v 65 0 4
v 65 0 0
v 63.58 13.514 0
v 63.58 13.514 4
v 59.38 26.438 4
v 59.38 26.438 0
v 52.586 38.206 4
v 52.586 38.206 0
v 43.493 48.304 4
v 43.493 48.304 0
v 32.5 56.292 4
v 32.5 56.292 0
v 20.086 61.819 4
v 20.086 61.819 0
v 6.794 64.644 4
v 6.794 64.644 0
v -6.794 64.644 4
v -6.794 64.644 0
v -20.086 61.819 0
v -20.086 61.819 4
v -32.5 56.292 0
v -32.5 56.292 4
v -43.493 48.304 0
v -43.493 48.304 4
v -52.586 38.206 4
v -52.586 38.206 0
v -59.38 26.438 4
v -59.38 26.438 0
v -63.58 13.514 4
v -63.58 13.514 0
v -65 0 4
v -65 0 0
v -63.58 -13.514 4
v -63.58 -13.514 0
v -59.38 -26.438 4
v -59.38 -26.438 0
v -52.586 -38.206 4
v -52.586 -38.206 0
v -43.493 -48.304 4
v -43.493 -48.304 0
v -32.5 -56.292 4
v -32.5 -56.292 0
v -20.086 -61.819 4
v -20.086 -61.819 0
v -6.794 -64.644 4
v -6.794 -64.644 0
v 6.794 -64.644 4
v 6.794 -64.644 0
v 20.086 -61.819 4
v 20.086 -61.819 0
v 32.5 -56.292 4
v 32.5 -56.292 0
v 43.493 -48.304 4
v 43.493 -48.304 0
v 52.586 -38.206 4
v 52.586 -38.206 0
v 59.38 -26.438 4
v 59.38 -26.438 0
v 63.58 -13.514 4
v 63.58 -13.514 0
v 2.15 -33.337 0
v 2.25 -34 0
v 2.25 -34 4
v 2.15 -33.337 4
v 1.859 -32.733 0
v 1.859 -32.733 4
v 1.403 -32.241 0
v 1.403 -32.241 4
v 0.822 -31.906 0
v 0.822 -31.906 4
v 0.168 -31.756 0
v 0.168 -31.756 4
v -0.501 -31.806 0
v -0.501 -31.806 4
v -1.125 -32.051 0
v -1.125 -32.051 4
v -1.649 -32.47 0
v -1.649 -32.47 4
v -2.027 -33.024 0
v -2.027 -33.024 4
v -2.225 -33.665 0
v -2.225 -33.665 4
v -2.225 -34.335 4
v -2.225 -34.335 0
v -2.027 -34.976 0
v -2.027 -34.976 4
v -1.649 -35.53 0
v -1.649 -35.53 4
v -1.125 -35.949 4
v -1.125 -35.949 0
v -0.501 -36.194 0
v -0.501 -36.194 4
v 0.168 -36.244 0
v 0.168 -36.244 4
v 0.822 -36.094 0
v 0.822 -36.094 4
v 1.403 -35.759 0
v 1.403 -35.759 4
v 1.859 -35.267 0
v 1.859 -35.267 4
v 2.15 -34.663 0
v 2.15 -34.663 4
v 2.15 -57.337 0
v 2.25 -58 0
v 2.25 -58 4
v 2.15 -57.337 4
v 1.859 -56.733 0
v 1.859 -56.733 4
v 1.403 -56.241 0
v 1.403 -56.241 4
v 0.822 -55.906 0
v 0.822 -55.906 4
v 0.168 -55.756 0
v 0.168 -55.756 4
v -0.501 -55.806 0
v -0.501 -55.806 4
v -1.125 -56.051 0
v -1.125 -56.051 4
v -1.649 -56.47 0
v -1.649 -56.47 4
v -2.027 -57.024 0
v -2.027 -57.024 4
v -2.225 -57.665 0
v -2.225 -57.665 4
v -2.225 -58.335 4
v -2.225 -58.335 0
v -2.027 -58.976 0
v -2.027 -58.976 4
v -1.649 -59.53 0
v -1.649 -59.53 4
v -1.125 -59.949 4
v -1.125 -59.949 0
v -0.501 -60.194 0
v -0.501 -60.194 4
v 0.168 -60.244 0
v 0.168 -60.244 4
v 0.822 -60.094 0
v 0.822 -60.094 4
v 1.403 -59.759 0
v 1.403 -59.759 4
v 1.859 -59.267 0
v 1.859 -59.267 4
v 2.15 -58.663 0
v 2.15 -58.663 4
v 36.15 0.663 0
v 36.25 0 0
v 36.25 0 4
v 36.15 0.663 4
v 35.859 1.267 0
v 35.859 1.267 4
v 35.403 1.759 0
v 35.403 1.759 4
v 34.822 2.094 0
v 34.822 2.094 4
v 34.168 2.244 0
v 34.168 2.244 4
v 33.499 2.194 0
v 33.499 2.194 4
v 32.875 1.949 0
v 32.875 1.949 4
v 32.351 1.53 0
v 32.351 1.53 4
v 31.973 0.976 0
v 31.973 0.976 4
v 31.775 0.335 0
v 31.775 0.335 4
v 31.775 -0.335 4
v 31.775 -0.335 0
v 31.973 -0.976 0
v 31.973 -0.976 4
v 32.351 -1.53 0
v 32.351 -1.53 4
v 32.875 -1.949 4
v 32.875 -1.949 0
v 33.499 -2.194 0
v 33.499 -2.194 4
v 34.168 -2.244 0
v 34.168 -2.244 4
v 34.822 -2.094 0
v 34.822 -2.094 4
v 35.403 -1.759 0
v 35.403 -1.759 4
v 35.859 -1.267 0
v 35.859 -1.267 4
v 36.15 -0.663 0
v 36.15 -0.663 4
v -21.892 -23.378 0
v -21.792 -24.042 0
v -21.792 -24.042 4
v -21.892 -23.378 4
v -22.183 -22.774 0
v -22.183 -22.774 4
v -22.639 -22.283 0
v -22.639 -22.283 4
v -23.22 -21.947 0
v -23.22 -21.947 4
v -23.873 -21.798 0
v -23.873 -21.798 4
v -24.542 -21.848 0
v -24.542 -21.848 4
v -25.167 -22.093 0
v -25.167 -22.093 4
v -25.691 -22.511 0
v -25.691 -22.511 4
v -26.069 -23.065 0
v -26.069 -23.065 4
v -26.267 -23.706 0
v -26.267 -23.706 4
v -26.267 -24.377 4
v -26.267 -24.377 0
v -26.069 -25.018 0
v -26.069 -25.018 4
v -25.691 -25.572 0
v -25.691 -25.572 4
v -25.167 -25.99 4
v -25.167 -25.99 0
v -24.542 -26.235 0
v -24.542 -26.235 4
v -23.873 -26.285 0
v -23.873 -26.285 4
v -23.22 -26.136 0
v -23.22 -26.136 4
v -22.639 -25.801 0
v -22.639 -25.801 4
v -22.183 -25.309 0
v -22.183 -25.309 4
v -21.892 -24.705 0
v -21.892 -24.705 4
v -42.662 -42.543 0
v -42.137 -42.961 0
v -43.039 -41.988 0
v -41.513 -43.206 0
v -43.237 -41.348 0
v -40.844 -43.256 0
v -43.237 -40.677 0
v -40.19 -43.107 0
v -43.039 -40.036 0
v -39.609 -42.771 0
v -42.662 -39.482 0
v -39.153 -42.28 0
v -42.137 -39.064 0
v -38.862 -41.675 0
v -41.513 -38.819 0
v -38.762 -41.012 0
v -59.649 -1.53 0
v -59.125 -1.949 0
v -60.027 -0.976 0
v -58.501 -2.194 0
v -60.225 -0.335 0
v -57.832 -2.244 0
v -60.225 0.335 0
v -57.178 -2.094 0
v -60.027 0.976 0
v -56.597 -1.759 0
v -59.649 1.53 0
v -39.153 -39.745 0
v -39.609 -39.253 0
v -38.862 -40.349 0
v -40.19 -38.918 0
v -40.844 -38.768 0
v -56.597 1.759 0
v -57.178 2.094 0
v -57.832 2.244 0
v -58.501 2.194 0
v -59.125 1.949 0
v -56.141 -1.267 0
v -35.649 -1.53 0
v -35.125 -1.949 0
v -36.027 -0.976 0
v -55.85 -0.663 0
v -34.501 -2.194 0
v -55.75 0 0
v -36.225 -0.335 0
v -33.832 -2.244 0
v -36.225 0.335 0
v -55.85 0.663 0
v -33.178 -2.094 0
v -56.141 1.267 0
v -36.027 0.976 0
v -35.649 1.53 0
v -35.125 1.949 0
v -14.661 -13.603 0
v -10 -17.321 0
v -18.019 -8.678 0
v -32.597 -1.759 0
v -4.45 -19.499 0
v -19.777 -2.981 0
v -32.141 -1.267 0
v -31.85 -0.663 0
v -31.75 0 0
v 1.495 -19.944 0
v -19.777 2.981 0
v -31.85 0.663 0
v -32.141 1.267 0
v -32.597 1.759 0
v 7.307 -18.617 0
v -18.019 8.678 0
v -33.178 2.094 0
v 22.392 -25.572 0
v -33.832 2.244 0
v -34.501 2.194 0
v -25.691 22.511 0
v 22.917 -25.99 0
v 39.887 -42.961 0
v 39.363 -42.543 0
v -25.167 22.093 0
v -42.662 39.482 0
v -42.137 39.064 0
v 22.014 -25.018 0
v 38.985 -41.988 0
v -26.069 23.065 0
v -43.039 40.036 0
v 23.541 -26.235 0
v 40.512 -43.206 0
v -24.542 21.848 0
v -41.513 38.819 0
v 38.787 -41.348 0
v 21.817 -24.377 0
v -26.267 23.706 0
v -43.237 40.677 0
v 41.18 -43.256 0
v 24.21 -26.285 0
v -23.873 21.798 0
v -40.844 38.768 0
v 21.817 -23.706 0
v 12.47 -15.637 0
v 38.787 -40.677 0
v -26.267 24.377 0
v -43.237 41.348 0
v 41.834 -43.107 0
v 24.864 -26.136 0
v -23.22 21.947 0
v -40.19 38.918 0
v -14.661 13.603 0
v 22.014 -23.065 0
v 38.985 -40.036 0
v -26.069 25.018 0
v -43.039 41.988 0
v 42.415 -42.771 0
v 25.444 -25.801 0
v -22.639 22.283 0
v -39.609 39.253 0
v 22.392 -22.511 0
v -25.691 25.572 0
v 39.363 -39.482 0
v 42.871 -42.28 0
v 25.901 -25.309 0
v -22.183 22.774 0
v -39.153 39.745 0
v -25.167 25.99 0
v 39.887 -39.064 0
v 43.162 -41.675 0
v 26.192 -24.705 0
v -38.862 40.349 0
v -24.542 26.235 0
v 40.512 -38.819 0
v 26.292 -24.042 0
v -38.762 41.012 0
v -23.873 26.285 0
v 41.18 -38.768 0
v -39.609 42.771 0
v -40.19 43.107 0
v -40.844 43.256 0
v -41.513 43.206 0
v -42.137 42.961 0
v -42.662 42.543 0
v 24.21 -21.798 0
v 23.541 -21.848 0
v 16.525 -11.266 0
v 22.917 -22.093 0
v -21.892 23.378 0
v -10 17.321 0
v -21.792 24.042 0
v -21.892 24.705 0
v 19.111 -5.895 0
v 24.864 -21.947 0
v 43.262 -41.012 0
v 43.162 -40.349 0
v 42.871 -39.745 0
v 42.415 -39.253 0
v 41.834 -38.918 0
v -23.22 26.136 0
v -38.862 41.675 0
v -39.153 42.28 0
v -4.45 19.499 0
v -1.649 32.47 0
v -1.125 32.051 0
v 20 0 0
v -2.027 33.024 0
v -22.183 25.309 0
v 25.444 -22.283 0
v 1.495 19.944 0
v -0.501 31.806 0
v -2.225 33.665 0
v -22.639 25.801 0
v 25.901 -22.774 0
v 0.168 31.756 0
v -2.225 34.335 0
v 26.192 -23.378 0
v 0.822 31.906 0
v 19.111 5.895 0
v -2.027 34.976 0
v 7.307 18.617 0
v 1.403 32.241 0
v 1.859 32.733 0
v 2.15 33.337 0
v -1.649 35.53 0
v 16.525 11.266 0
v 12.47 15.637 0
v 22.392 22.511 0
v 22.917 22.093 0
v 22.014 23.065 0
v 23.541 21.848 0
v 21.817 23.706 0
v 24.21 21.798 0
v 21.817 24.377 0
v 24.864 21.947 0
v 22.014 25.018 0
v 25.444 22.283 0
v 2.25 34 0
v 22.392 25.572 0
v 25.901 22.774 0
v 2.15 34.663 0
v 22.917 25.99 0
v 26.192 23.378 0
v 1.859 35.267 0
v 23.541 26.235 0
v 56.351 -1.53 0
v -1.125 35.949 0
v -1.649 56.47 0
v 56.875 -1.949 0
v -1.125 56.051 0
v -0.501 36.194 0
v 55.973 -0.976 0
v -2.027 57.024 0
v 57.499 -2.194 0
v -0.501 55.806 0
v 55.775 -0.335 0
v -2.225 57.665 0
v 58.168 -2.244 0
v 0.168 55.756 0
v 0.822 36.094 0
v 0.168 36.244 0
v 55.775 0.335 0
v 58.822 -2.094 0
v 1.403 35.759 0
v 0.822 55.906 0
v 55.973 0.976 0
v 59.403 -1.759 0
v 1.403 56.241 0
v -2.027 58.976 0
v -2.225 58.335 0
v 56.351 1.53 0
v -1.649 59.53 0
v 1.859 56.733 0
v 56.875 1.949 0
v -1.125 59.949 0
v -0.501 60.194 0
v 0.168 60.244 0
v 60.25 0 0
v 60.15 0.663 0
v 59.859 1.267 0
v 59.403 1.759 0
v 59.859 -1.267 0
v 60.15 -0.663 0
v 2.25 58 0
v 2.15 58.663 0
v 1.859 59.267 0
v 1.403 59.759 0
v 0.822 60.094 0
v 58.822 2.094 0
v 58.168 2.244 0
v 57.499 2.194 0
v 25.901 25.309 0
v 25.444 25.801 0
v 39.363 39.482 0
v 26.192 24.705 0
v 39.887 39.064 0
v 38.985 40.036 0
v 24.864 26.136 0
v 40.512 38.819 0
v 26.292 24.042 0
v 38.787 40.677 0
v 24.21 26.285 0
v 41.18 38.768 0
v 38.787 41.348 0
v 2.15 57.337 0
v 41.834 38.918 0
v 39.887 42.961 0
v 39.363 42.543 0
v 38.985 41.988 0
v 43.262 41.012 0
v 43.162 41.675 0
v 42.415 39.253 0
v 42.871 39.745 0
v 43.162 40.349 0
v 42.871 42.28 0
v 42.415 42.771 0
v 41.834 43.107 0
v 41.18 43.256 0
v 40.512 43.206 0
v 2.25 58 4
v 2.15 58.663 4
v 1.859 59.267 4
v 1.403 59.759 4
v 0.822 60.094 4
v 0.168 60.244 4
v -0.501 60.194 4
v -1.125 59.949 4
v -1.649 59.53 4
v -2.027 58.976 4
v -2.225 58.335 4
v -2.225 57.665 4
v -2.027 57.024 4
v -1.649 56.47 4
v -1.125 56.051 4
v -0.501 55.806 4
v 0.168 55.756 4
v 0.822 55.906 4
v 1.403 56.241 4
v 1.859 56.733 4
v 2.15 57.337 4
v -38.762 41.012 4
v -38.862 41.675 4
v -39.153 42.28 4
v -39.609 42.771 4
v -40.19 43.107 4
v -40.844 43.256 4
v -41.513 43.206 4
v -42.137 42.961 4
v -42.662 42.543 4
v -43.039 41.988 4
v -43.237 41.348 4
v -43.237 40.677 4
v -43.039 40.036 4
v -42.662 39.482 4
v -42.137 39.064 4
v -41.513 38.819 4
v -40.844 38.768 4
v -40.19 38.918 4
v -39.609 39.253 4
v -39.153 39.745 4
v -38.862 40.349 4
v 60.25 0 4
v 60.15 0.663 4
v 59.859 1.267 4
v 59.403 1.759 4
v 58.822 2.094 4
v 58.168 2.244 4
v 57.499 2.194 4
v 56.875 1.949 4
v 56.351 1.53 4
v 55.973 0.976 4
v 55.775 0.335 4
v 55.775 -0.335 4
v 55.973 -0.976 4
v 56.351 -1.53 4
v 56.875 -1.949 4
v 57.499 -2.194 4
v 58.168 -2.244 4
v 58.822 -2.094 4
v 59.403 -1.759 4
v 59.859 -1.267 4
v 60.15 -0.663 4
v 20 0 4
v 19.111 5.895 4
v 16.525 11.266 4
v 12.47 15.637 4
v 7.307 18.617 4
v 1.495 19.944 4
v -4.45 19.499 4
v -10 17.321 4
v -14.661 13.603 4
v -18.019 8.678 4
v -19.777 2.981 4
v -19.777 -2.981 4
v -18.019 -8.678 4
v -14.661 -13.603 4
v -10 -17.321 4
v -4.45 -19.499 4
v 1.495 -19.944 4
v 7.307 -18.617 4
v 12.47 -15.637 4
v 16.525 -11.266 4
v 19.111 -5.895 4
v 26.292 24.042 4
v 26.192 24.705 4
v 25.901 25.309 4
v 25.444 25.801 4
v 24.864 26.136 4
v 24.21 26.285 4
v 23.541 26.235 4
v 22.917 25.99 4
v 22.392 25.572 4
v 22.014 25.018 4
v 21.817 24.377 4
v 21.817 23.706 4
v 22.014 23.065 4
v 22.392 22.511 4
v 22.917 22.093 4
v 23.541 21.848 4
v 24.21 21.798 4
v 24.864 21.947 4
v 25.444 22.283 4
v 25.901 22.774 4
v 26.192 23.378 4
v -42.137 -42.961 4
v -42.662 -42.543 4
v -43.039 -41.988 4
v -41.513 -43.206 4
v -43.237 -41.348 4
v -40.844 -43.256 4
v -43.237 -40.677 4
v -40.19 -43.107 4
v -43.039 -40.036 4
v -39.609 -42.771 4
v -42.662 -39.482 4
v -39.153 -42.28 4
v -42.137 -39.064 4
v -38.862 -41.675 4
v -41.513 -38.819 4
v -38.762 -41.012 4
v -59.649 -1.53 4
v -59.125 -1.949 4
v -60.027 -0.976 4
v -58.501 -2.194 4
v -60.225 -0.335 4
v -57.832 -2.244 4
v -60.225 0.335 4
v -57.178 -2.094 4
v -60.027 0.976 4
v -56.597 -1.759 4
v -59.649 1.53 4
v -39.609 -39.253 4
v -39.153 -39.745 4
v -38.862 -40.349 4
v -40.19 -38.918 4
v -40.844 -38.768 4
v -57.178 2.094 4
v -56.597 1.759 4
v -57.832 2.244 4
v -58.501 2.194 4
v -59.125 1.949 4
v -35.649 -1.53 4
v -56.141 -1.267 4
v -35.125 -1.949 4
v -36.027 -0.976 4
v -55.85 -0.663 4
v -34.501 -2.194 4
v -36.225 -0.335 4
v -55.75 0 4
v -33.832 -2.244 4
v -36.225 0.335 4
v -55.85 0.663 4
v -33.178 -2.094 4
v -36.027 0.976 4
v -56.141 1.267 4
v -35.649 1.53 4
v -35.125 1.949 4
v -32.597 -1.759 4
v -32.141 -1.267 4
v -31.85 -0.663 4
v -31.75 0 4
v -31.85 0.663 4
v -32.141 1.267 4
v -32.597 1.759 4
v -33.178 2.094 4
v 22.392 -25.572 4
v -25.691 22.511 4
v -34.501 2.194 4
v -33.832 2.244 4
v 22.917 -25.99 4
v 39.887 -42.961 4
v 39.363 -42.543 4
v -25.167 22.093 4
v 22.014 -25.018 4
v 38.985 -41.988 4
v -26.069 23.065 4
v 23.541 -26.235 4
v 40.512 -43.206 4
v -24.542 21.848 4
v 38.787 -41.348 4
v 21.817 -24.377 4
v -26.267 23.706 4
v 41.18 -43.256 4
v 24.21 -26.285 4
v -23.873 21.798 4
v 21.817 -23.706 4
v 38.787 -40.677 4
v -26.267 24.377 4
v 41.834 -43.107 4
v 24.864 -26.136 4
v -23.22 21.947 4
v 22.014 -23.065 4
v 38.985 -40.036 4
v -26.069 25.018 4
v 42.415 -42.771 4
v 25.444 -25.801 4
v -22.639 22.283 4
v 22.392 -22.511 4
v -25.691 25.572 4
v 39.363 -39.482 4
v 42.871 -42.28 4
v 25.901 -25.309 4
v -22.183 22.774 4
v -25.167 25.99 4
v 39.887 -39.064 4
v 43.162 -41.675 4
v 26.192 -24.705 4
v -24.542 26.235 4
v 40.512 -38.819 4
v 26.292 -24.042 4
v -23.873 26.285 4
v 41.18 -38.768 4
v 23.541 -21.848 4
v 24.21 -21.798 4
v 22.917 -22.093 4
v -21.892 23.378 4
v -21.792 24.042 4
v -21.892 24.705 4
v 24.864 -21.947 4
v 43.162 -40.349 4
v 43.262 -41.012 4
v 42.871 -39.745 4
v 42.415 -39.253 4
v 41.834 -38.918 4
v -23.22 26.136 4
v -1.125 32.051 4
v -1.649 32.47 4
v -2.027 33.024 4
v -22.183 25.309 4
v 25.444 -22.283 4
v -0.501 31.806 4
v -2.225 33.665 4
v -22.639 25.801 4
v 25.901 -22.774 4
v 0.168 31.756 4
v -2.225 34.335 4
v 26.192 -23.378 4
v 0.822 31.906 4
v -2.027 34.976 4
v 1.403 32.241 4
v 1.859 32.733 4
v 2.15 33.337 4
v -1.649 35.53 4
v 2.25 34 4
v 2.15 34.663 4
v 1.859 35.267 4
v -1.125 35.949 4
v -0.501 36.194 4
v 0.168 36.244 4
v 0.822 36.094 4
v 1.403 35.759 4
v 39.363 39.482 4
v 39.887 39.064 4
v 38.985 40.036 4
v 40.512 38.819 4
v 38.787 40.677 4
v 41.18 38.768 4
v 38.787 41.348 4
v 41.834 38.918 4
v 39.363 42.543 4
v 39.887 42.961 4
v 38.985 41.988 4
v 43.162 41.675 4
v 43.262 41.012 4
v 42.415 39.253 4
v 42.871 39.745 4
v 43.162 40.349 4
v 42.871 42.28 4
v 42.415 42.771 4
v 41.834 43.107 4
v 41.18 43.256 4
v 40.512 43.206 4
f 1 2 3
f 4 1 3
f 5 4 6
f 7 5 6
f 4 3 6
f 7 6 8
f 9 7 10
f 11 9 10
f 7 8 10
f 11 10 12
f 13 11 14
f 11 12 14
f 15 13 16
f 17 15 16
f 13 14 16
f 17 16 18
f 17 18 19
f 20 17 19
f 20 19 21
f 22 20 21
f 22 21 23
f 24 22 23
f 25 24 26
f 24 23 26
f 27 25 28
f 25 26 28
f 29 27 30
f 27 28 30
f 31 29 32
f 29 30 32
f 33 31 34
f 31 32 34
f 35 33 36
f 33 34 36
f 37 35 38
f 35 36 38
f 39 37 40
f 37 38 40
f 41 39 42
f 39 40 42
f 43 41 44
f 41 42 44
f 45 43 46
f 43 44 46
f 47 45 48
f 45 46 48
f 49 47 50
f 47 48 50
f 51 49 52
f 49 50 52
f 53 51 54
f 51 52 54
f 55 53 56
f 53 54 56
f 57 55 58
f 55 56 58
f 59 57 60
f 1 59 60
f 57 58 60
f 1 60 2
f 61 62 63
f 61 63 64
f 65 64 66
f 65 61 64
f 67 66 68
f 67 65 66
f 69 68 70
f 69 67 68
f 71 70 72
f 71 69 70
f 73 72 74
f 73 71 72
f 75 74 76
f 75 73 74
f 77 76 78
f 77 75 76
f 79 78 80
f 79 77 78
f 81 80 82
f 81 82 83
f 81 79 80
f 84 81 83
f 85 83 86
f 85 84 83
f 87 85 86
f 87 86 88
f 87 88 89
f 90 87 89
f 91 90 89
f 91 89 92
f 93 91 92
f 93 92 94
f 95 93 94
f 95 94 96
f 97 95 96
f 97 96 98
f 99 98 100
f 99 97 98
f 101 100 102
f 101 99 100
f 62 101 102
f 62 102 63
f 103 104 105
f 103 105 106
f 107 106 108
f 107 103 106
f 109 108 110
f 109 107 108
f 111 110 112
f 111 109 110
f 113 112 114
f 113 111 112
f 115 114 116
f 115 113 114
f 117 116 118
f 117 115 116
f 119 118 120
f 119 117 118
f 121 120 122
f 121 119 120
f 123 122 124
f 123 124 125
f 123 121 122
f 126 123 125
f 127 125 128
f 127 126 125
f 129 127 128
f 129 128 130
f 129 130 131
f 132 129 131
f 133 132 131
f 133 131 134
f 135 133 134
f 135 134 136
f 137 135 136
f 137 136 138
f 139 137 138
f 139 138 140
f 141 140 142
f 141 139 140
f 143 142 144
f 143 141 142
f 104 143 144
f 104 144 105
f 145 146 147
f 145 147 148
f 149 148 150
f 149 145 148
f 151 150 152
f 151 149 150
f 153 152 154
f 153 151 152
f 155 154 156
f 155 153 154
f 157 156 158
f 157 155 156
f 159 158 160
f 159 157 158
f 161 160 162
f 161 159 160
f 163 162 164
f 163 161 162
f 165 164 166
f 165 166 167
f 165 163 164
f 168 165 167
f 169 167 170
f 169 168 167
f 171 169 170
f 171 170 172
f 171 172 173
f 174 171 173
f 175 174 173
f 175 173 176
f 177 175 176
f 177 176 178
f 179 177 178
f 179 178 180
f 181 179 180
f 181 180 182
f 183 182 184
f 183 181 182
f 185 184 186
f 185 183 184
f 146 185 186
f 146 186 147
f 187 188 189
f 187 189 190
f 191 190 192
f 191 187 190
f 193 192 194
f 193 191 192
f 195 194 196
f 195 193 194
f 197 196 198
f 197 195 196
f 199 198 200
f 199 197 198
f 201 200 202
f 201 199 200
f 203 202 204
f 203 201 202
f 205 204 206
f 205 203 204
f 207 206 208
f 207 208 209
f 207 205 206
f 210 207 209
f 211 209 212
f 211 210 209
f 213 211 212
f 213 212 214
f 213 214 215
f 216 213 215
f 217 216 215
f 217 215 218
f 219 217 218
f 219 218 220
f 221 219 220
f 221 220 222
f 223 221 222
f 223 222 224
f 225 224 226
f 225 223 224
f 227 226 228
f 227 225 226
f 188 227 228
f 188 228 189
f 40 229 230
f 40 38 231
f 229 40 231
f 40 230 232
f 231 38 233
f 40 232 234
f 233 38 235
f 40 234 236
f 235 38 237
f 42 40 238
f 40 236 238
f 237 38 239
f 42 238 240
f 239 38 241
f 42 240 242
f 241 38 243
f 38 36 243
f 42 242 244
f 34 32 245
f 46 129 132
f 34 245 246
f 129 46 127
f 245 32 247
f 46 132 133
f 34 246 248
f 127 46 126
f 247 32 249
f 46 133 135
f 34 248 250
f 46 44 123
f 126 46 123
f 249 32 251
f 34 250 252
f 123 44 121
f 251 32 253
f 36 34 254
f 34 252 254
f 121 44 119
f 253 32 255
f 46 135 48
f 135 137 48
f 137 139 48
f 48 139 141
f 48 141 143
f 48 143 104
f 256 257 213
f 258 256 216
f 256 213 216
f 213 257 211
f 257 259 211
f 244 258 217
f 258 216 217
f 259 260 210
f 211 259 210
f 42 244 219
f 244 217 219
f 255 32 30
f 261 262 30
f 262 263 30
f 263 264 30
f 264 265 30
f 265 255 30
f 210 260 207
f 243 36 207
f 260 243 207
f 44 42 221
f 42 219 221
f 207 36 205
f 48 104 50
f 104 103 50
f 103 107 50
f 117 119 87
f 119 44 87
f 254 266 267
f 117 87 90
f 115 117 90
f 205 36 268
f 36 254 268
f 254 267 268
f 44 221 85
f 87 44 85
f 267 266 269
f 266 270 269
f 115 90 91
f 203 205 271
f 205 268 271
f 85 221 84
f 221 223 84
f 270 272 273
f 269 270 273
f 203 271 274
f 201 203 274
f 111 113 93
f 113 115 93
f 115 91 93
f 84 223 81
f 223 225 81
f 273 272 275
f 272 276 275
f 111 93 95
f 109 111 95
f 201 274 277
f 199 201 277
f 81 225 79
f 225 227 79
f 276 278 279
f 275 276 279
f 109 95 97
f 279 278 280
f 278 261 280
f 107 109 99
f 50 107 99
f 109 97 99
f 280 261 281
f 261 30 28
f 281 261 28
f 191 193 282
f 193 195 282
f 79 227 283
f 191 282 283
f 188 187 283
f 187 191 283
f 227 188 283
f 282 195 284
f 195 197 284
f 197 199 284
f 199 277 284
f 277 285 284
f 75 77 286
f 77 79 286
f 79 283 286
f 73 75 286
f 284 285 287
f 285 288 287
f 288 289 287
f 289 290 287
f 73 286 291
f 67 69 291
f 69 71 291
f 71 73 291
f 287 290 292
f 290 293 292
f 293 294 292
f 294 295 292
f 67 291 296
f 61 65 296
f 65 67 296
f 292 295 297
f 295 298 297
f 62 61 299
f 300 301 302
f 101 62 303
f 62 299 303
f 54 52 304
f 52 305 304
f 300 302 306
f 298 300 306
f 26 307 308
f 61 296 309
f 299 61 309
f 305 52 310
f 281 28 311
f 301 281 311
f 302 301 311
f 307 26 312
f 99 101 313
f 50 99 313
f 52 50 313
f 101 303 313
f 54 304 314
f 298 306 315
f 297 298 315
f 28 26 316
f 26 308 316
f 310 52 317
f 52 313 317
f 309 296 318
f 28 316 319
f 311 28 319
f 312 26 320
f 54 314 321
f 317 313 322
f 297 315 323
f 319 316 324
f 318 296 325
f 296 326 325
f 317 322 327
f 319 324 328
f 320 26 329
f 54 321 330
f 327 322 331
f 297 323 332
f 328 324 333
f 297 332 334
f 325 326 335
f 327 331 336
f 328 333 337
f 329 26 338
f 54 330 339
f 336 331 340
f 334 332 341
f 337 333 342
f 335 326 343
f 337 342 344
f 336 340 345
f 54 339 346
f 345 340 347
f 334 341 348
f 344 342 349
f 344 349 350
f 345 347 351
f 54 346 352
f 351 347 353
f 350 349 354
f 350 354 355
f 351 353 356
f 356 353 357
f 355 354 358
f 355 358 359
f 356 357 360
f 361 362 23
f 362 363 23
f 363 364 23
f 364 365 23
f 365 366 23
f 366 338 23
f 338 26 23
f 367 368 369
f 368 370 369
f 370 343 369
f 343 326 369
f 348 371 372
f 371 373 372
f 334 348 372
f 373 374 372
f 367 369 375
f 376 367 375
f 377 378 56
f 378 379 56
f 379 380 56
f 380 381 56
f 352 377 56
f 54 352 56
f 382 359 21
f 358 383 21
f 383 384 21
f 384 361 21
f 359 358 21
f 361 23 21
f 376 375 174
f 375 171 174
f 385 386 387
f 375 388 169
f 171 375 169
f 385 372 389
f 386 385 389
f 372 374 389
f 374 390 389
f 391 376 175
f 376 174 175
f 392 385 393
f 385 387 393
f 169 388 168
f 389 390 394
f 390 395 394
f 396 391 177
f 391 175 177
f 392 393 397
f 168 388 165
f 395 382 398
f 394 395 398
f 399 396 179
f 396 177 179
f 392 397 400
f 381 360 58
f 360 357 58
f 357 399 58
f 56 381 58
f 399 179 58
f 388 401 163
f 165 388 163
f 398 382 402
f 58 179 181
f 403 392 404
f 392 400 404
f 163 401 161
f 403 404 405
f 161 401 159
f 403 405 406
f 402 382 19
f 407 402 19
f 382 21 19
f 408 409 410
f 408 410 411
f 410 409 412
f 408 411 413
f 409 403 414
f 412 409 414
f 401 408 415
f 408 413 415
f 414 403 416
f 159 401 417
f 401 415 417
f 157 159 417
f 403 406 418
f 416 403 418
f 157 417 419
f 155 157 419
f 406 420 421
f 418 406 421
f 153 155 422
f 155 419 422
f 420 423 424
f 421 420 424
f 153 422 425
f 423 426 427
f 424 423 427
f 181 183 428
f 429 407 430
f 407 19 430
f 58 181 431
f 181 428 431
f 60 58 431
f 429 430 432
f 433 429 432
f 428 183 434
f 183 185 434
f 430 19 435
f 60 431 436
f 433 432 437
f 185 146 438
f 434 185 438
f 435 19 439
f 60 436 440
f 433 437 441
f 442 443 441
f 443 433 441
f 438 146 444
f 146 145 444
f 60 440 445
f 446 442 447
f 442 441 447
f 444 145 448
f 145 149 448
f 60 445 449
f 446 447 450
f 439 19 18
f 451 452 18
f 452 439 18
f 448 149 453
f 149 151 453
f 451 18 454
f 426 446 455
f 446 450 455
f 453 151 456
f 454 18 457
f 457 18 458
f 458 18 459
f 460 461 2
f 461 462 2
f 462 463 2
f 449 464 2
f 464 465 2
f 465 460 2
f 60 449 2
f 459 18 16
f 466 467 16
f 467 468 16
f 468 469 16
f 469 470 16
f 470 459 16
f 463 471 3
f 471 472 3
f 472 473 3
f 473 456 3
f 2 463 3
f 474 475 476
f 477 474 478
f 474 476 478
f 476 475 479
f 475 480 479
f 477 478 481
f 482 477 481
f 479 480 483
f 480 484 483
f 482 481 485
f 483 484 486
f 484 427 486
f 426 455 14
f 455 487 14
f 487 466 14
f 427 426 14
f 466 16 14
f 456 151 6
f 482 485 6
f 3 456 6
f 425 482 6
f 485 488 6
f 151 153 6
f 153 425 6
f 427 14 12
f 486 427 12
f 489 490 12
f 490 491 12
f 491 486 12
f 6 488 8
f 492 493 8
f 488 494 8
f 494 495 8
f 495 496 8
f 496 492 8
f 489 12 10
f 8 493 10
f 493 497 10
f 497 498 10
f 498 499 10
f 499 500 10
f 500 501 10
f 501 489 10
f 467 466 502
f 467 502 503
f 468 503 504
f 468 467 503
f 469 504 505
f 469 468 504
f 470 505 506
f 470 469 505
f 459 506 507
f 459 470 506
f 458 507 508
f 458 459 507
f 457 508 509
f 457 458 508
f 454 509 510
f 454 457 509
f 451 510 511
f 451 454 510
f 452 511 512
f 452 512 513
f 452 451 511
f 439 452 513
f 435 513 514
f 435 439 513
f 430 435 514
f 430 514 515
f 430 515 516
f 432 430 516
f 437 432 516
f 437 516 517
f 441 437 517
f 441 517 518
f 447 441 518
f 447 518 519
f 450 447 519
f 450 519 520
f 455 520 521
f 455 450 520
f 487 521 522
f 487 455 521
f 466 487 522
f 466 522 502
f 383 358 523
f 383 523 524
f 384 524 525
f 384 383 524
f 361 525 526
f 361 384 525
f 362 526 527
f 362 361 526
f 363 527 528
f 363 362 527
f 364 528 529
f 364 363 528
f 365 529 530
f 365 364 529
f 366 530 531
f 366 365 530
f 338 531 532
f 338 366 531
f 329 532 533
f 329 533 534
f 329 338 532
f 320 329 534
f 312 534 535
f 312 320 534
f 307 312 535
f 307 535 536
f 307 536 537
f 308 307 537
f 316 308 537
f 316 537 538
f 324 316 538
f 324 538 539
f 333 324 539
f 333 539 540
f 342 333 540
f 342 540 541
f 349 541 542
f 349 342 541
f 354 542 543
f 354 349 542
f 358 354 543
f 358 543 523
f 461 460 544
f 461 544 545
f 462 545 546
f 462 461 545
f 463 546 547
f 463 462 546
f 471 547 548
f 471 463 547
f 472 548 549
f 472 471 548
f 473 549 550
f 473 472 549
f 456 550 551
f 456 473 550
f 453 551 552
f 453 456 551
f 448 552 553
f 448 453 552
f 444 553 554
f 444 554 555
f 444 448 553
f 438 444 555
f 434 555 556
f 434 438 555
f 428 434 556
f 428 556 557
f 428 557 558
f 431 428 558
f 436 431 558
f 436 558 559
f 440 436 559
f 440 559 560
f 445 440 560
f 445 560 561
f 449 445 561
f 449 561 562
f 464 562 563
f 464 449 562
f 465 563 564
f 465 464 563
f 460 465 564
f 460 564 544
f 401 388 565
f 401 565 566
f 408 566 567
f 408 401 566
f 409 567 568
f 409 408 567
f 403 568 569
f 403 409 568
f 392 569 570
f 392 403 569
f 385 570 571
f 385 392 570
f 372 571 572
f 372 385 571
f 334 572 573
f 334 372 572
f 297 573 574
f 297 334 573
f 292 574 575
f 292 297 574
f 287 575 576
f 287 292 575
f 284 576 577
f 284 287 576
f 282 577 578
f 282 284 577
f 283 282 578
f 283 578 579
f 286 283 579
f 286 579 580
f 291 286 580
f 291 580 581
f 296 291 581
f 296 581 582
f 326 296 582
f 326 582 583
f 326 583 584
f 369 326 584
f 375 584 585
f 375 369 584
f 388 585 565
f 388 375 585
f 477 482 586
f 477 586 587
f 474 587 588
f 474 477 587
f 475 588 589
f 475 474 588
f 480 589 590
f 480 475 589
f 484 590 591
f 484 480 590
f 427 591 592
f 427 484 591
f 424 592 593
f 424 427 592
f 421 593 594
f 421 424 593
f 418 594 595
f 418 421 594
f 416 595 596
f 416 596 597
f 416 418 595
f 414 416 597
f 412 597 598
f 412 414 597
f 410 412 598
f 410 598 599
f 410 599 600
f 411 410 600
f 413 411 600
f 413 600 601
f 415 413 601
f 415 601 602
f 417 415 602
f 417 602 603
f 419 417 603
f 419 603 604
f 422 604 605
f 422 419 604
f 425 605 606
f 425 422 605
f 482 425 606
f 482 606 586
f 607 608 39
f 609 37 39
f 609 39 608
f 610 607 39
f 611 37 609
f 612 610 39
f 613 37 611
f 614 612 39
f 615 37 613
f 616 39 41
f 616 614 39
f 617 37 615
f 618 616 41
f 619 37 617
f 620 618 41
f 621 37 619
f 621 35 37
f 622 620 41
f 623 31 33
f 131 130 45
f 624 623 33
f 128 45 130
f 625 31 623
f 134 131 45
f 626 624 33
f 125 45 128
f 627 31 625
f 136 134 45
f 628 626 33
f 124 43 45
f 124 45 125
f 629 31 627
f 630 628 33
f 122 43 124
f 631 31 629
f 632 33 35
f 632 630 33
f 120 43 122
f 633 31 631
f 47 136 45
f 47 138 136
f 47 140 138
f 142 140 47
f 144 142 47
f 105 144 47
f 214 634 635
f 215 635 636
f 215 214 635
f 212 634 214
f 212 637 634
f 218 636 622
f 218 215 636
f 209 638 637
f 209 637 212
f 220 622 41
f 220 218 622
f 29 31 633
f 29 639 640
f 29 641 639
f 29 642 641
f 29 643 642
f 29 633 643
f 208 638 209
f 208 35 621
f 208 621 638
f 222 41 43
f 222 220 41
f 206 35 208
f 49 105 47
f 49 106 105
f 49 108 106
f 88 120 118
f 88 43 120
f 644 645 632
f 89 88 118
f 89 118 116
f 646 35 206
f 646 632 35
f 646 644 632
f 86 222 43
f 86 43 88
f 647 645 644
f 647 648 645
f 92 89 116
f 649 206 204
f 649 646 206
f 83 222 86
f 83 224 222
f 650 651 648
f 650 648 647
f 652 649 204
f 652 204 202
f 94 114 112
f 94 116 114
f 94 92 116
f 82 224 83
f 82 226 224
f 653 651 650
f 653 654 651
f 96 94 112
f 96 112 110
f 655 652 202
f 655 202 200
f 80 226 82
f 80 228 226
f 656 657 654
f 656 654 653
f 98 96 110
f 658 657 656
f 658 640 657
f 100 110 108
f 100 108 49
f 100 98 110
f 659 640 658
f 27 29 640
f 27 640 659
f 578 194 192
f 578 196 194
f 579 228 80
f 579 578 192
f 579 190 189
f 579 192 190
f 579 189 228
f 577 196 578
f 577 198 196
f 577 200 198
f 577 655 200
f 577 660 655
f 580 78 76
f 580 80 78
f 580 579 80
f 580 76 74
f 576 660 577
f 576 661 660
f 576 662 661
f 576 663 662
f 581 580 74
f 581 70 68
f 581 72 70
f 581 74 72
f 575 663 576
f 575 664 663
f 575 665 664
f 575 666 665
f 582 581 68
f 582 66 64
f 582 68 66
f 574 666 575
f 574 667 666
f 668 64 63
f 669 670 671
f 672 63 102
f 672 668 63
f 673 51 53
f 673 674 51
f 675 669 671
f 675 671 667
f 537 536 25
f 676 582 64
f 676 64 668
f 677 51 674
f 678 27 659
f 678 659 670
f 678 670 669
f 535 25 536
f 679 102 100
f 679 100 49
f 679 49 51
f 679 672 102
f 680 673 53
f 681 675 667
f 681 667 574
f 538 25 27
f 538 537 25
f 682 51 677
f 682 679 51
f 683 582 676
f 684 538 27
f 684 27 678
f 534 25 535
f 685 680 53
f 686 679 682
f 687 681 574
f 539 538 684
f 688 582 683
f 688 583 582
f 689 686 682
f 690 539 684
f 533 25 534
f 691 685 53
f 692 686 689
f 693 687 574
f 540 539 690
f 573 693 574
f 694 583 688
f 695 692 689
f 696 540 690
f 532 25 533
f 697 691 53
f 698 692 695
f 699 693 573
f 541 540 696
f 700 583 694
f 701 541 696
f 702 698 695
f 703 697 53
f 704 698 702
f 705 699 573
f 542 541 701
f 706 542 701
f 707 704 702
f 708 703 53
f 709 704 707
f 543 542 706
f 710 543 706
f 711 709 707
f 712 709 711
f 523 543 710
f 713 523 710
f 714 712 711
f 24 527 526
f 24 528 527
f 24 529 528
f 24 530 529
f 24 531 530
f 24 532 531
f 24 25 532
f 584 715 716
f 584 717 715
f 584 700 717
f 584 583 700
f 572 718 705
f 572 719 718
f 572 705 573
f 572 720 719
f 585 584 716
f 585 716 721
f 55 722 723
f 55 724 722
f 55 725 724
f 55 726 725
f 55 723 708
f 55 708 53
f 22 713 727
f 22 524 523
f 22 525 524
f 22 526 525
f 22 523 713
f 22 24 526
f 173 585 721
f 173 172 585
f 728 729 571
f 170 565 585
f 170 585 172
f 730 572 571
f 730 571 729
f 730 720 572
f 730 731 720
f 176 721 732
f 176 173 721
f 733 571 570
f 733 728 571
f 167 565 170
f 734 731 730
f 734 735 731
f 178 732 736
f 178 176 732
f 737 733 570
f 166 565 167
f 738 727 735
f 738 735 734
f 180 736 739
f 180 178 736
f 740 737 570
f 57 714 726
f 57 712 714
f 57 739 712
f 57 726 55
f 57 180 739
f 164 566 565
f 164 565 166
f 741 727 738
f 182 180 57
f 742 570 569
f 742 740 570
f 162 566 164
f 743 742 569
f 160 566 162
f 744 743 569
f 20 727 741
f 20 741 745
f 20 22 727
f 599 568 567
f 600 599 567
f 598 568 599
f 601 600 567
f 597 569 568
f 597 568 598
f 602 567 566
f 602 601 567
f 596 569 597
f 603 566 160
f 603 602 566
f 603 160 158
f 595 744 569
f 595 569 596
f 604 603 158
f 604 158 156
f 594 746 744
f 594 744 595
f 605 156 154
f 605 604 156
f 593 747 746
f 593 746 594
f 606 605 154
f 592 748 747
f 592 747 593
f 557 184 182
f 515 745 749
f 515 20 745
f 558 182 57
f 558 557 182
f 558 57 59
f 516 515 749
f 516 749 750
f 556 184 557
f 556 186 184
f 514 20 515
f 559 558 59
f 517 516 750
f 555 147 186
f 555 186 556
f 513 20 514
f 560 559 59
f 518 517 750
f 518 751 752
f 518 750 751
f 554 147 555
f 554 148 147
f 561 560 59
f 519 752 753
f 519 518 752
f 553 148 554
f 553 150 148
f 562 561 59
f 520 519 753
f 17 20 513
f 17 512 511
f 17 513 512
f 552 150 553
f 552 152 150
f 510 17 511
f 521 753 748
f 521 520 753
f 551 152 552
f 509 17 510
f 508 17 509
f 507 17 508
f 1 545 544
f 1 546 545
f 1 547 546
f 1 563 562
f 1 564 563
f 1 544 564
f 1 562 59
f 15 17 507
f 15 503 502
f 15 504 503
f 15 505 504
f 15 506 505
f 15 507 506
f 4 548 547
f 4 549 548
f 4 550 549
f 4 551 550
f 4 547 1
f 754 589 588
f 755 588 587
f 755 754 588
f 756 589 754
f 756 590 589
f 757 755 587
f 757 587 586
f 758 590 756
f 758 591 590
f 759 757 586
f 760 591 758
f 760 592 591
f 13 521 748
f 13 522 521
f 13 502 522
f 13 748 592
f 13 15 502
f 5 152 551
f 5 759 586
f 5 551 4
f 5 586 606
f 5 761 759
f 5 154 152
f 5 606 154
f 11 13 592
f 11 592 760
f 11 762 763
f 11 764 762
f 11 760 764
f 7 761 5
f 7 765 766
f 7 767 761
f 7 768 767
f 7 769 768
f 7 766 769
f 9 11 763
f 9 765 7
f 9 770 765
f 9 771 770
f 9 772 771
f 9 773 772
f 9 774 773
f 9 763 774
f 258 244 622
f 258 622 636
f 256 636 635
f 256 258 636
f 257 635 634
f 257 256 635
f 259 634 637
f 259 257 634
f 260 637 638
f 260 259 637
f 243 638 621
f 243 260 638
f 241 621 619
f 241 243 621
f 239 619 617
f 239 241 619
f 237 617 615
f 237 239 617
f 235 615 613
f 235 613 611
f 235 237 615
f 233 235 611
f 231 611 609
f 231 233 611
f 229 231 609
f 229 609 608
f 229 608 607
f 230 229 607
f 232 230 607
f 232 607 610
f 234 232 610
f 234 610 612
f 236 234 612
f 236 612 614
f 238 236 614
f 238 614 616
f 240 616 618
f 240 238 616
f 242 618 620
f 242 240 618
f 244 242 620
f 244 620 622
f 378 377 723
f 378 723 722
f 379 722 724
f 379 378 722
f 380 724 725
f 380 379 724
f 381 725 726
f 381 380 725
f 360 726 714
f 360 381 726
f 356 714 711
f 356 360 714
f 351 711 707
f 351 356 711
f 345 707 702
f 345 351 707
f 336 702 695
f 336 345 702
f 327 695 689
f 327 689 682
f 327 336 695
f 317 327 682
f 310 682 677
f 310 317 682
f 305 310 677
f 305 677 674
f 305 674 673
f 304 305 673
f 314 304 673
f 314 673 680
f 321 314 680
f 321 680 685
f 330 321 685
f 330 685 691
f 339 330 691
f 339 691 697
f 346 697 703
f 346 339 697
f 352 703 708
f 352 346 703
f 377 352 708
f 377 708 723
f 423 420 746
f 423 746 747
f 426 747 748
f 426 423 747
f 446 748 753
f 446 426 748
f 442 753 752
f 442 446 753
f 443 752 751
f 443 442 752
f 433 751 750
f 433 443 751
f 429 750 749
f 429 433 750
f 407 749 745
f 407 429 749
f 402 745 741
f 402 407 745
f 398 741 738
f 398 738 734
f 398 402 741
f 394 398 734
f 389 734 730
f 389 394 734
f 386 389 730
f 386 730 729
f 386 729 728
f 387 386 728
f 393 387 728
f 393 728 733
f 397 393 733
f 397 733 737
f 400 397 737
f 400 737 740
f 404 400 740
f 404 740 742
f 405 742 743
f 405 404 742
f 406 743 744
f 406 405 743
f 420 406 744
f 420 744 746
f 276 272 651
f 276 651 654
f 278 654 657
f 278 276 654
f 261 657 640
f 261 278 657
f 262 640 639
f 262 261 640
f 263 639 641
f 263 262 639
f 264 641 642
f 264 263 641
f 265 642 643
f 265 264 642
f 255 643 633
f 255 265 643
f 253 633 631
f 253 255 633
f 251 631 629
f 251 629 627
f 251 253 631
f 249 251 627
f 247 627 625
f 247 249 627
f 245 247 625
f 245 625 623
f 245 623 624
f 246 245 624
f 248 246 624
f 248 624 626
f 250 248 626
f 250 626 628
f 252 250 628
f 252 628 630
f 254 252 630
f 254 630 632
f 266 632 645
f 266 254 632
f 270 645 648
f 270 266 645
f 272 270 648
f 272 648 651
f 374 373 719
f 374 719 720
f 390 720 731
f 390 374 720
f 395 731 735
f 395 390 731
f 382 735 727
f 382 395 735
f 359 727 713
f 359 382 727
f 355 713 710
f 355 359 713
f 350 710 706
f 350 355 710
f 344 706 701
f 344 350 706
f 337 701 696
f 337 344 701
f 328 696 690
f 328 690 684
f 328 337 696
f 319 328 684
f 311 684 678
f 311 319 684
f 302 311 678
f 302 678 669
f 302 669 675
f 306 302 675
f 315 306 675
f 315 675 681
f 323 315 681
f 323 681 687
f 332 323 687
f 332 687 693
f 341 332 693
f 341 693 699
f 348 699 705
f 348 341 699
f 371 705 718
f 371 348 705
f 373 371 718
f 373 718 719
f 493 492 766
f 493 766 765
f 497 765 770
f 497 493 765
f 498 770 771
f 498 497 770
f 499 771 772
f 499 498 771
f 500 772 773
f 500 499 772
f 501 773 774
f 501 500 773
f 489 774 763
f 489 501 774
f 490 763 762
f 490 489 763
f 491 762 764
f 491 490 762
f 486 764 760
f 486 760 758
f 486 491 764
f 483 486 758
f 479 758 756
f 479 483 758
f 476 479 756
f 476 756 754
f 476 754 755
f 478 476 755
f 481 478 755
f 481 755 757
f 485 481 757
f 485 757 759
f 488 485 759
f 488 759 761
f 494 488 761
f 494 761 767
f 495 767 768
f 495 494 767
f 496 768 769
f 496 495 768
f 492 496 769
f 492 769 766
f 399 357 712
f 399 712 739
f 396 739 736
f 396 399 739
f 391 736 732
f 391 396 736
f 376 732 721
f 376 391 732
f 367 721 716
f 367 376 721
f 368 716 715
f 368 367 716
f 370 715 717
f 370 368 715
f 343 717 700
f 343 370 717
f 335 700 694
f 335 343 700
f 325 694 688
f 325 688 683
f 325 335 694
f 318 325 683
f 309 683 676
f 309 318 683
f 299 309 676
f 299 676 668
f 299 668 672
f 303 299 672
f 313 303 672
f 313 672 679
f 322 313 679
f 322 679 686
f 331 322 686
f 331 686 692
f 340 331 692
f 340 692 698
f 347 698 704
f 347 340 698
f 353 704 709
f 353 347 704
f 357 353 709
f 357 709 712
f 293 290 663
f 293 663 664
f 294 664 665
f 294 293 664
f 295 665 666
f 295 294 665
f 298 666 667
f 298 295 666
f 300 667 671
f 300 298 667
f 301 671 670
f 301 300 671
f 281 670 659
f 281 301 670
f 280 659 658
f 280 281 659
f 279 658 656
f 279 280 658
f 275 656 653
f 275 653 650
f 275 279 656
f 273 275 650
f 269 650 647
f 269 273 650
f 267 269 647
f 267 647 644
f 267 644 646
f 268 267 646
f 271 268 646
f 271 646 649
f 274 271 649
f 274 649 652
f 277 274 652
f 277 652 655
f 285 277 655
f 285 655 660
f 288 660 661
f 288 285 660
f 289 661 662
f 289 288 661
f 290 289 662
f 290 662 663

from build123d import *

# Parameters (mm, degrees)
SKETCH_R      = 65
SKETCH_R_2    = 20
SKETCH_R_3    = 2.25
EXTRUDE_DEPTH = 4


with BuildPart() as part:
    # Sketch → Extrude (new body)
    with BuildSketch(Plane.XY):
        Circle(SKETCH_R)
        Circle(SKETCH_R_2, mode=Mode.SUBTRACT)
        with Locations((-24.041631, 24.041631)):
            Circle(SKETCH_R_3, mode=Mode.SUBTRACT)
        with Locations((0, 34)):
            Circle(SKETCH_R_3, mode=Mode.SUBTRACT)
        with Locations((34, 0)):
            Circle(SKETCH_R_3, mode=Mode.SUBTRACT)
        with Locations((0, -34)):
            Circle(SKETCH_R_3, mode=Mode.SUBTRACT)
        with Locations((-24.041631, -24.041631)):
            Circle(SKETCH_R_3, mode=Mode.SUBTRACT)
        with Locations((-34, 0)):
            Circle(SKETCH_R_3, mode=Mode.SUBTRACT)
        with Locations((24.041631, -24.041631)):
            Circle(SKETCH_R_3, mode=Mode.SUBTRACT)
        with Locations((24.041631, 24.041631)):
            Circle(SKETCH_R_3, mode=Mode.SUBTRACT)
        with Locations((41.012193, 41.012193)):
            Circle(SKETCH_R_3, mode=Mode.SUBTRACT)
        with Locations((-58, 0)):
            Circle(SKETCH_R_3, mode=Mode.SUBTRACT)
        with Locations((0, -58)):
            Circle(SKETCH_R_3, mode=Mode.SUBTRACT)
        with Locations((-41.012193, -41.012193)):
            Circle(SKETCH_R_3, mode=Mode.SUBTRACT)
        with Locations((-41.012193, 41.012193)):
            Circle(SKETCH_R_3, mode=Mode.SUBTRACT)
        with Locations((41.012193, -41.012193)):
            Circle(SKETCH_R_3, mode=Mode.SUBTRACT)
        with Locations((0, 58)):
            Circle(SKETCH_R_3, mode=Mode.SUBTRACT)
        with Locations((58, 0)):
            Circle(SKETCH_R_3, mode=Mode.SUBTRACT)
    extrude(amount=EXTRUDE_DEPTH)


solid = part.part
